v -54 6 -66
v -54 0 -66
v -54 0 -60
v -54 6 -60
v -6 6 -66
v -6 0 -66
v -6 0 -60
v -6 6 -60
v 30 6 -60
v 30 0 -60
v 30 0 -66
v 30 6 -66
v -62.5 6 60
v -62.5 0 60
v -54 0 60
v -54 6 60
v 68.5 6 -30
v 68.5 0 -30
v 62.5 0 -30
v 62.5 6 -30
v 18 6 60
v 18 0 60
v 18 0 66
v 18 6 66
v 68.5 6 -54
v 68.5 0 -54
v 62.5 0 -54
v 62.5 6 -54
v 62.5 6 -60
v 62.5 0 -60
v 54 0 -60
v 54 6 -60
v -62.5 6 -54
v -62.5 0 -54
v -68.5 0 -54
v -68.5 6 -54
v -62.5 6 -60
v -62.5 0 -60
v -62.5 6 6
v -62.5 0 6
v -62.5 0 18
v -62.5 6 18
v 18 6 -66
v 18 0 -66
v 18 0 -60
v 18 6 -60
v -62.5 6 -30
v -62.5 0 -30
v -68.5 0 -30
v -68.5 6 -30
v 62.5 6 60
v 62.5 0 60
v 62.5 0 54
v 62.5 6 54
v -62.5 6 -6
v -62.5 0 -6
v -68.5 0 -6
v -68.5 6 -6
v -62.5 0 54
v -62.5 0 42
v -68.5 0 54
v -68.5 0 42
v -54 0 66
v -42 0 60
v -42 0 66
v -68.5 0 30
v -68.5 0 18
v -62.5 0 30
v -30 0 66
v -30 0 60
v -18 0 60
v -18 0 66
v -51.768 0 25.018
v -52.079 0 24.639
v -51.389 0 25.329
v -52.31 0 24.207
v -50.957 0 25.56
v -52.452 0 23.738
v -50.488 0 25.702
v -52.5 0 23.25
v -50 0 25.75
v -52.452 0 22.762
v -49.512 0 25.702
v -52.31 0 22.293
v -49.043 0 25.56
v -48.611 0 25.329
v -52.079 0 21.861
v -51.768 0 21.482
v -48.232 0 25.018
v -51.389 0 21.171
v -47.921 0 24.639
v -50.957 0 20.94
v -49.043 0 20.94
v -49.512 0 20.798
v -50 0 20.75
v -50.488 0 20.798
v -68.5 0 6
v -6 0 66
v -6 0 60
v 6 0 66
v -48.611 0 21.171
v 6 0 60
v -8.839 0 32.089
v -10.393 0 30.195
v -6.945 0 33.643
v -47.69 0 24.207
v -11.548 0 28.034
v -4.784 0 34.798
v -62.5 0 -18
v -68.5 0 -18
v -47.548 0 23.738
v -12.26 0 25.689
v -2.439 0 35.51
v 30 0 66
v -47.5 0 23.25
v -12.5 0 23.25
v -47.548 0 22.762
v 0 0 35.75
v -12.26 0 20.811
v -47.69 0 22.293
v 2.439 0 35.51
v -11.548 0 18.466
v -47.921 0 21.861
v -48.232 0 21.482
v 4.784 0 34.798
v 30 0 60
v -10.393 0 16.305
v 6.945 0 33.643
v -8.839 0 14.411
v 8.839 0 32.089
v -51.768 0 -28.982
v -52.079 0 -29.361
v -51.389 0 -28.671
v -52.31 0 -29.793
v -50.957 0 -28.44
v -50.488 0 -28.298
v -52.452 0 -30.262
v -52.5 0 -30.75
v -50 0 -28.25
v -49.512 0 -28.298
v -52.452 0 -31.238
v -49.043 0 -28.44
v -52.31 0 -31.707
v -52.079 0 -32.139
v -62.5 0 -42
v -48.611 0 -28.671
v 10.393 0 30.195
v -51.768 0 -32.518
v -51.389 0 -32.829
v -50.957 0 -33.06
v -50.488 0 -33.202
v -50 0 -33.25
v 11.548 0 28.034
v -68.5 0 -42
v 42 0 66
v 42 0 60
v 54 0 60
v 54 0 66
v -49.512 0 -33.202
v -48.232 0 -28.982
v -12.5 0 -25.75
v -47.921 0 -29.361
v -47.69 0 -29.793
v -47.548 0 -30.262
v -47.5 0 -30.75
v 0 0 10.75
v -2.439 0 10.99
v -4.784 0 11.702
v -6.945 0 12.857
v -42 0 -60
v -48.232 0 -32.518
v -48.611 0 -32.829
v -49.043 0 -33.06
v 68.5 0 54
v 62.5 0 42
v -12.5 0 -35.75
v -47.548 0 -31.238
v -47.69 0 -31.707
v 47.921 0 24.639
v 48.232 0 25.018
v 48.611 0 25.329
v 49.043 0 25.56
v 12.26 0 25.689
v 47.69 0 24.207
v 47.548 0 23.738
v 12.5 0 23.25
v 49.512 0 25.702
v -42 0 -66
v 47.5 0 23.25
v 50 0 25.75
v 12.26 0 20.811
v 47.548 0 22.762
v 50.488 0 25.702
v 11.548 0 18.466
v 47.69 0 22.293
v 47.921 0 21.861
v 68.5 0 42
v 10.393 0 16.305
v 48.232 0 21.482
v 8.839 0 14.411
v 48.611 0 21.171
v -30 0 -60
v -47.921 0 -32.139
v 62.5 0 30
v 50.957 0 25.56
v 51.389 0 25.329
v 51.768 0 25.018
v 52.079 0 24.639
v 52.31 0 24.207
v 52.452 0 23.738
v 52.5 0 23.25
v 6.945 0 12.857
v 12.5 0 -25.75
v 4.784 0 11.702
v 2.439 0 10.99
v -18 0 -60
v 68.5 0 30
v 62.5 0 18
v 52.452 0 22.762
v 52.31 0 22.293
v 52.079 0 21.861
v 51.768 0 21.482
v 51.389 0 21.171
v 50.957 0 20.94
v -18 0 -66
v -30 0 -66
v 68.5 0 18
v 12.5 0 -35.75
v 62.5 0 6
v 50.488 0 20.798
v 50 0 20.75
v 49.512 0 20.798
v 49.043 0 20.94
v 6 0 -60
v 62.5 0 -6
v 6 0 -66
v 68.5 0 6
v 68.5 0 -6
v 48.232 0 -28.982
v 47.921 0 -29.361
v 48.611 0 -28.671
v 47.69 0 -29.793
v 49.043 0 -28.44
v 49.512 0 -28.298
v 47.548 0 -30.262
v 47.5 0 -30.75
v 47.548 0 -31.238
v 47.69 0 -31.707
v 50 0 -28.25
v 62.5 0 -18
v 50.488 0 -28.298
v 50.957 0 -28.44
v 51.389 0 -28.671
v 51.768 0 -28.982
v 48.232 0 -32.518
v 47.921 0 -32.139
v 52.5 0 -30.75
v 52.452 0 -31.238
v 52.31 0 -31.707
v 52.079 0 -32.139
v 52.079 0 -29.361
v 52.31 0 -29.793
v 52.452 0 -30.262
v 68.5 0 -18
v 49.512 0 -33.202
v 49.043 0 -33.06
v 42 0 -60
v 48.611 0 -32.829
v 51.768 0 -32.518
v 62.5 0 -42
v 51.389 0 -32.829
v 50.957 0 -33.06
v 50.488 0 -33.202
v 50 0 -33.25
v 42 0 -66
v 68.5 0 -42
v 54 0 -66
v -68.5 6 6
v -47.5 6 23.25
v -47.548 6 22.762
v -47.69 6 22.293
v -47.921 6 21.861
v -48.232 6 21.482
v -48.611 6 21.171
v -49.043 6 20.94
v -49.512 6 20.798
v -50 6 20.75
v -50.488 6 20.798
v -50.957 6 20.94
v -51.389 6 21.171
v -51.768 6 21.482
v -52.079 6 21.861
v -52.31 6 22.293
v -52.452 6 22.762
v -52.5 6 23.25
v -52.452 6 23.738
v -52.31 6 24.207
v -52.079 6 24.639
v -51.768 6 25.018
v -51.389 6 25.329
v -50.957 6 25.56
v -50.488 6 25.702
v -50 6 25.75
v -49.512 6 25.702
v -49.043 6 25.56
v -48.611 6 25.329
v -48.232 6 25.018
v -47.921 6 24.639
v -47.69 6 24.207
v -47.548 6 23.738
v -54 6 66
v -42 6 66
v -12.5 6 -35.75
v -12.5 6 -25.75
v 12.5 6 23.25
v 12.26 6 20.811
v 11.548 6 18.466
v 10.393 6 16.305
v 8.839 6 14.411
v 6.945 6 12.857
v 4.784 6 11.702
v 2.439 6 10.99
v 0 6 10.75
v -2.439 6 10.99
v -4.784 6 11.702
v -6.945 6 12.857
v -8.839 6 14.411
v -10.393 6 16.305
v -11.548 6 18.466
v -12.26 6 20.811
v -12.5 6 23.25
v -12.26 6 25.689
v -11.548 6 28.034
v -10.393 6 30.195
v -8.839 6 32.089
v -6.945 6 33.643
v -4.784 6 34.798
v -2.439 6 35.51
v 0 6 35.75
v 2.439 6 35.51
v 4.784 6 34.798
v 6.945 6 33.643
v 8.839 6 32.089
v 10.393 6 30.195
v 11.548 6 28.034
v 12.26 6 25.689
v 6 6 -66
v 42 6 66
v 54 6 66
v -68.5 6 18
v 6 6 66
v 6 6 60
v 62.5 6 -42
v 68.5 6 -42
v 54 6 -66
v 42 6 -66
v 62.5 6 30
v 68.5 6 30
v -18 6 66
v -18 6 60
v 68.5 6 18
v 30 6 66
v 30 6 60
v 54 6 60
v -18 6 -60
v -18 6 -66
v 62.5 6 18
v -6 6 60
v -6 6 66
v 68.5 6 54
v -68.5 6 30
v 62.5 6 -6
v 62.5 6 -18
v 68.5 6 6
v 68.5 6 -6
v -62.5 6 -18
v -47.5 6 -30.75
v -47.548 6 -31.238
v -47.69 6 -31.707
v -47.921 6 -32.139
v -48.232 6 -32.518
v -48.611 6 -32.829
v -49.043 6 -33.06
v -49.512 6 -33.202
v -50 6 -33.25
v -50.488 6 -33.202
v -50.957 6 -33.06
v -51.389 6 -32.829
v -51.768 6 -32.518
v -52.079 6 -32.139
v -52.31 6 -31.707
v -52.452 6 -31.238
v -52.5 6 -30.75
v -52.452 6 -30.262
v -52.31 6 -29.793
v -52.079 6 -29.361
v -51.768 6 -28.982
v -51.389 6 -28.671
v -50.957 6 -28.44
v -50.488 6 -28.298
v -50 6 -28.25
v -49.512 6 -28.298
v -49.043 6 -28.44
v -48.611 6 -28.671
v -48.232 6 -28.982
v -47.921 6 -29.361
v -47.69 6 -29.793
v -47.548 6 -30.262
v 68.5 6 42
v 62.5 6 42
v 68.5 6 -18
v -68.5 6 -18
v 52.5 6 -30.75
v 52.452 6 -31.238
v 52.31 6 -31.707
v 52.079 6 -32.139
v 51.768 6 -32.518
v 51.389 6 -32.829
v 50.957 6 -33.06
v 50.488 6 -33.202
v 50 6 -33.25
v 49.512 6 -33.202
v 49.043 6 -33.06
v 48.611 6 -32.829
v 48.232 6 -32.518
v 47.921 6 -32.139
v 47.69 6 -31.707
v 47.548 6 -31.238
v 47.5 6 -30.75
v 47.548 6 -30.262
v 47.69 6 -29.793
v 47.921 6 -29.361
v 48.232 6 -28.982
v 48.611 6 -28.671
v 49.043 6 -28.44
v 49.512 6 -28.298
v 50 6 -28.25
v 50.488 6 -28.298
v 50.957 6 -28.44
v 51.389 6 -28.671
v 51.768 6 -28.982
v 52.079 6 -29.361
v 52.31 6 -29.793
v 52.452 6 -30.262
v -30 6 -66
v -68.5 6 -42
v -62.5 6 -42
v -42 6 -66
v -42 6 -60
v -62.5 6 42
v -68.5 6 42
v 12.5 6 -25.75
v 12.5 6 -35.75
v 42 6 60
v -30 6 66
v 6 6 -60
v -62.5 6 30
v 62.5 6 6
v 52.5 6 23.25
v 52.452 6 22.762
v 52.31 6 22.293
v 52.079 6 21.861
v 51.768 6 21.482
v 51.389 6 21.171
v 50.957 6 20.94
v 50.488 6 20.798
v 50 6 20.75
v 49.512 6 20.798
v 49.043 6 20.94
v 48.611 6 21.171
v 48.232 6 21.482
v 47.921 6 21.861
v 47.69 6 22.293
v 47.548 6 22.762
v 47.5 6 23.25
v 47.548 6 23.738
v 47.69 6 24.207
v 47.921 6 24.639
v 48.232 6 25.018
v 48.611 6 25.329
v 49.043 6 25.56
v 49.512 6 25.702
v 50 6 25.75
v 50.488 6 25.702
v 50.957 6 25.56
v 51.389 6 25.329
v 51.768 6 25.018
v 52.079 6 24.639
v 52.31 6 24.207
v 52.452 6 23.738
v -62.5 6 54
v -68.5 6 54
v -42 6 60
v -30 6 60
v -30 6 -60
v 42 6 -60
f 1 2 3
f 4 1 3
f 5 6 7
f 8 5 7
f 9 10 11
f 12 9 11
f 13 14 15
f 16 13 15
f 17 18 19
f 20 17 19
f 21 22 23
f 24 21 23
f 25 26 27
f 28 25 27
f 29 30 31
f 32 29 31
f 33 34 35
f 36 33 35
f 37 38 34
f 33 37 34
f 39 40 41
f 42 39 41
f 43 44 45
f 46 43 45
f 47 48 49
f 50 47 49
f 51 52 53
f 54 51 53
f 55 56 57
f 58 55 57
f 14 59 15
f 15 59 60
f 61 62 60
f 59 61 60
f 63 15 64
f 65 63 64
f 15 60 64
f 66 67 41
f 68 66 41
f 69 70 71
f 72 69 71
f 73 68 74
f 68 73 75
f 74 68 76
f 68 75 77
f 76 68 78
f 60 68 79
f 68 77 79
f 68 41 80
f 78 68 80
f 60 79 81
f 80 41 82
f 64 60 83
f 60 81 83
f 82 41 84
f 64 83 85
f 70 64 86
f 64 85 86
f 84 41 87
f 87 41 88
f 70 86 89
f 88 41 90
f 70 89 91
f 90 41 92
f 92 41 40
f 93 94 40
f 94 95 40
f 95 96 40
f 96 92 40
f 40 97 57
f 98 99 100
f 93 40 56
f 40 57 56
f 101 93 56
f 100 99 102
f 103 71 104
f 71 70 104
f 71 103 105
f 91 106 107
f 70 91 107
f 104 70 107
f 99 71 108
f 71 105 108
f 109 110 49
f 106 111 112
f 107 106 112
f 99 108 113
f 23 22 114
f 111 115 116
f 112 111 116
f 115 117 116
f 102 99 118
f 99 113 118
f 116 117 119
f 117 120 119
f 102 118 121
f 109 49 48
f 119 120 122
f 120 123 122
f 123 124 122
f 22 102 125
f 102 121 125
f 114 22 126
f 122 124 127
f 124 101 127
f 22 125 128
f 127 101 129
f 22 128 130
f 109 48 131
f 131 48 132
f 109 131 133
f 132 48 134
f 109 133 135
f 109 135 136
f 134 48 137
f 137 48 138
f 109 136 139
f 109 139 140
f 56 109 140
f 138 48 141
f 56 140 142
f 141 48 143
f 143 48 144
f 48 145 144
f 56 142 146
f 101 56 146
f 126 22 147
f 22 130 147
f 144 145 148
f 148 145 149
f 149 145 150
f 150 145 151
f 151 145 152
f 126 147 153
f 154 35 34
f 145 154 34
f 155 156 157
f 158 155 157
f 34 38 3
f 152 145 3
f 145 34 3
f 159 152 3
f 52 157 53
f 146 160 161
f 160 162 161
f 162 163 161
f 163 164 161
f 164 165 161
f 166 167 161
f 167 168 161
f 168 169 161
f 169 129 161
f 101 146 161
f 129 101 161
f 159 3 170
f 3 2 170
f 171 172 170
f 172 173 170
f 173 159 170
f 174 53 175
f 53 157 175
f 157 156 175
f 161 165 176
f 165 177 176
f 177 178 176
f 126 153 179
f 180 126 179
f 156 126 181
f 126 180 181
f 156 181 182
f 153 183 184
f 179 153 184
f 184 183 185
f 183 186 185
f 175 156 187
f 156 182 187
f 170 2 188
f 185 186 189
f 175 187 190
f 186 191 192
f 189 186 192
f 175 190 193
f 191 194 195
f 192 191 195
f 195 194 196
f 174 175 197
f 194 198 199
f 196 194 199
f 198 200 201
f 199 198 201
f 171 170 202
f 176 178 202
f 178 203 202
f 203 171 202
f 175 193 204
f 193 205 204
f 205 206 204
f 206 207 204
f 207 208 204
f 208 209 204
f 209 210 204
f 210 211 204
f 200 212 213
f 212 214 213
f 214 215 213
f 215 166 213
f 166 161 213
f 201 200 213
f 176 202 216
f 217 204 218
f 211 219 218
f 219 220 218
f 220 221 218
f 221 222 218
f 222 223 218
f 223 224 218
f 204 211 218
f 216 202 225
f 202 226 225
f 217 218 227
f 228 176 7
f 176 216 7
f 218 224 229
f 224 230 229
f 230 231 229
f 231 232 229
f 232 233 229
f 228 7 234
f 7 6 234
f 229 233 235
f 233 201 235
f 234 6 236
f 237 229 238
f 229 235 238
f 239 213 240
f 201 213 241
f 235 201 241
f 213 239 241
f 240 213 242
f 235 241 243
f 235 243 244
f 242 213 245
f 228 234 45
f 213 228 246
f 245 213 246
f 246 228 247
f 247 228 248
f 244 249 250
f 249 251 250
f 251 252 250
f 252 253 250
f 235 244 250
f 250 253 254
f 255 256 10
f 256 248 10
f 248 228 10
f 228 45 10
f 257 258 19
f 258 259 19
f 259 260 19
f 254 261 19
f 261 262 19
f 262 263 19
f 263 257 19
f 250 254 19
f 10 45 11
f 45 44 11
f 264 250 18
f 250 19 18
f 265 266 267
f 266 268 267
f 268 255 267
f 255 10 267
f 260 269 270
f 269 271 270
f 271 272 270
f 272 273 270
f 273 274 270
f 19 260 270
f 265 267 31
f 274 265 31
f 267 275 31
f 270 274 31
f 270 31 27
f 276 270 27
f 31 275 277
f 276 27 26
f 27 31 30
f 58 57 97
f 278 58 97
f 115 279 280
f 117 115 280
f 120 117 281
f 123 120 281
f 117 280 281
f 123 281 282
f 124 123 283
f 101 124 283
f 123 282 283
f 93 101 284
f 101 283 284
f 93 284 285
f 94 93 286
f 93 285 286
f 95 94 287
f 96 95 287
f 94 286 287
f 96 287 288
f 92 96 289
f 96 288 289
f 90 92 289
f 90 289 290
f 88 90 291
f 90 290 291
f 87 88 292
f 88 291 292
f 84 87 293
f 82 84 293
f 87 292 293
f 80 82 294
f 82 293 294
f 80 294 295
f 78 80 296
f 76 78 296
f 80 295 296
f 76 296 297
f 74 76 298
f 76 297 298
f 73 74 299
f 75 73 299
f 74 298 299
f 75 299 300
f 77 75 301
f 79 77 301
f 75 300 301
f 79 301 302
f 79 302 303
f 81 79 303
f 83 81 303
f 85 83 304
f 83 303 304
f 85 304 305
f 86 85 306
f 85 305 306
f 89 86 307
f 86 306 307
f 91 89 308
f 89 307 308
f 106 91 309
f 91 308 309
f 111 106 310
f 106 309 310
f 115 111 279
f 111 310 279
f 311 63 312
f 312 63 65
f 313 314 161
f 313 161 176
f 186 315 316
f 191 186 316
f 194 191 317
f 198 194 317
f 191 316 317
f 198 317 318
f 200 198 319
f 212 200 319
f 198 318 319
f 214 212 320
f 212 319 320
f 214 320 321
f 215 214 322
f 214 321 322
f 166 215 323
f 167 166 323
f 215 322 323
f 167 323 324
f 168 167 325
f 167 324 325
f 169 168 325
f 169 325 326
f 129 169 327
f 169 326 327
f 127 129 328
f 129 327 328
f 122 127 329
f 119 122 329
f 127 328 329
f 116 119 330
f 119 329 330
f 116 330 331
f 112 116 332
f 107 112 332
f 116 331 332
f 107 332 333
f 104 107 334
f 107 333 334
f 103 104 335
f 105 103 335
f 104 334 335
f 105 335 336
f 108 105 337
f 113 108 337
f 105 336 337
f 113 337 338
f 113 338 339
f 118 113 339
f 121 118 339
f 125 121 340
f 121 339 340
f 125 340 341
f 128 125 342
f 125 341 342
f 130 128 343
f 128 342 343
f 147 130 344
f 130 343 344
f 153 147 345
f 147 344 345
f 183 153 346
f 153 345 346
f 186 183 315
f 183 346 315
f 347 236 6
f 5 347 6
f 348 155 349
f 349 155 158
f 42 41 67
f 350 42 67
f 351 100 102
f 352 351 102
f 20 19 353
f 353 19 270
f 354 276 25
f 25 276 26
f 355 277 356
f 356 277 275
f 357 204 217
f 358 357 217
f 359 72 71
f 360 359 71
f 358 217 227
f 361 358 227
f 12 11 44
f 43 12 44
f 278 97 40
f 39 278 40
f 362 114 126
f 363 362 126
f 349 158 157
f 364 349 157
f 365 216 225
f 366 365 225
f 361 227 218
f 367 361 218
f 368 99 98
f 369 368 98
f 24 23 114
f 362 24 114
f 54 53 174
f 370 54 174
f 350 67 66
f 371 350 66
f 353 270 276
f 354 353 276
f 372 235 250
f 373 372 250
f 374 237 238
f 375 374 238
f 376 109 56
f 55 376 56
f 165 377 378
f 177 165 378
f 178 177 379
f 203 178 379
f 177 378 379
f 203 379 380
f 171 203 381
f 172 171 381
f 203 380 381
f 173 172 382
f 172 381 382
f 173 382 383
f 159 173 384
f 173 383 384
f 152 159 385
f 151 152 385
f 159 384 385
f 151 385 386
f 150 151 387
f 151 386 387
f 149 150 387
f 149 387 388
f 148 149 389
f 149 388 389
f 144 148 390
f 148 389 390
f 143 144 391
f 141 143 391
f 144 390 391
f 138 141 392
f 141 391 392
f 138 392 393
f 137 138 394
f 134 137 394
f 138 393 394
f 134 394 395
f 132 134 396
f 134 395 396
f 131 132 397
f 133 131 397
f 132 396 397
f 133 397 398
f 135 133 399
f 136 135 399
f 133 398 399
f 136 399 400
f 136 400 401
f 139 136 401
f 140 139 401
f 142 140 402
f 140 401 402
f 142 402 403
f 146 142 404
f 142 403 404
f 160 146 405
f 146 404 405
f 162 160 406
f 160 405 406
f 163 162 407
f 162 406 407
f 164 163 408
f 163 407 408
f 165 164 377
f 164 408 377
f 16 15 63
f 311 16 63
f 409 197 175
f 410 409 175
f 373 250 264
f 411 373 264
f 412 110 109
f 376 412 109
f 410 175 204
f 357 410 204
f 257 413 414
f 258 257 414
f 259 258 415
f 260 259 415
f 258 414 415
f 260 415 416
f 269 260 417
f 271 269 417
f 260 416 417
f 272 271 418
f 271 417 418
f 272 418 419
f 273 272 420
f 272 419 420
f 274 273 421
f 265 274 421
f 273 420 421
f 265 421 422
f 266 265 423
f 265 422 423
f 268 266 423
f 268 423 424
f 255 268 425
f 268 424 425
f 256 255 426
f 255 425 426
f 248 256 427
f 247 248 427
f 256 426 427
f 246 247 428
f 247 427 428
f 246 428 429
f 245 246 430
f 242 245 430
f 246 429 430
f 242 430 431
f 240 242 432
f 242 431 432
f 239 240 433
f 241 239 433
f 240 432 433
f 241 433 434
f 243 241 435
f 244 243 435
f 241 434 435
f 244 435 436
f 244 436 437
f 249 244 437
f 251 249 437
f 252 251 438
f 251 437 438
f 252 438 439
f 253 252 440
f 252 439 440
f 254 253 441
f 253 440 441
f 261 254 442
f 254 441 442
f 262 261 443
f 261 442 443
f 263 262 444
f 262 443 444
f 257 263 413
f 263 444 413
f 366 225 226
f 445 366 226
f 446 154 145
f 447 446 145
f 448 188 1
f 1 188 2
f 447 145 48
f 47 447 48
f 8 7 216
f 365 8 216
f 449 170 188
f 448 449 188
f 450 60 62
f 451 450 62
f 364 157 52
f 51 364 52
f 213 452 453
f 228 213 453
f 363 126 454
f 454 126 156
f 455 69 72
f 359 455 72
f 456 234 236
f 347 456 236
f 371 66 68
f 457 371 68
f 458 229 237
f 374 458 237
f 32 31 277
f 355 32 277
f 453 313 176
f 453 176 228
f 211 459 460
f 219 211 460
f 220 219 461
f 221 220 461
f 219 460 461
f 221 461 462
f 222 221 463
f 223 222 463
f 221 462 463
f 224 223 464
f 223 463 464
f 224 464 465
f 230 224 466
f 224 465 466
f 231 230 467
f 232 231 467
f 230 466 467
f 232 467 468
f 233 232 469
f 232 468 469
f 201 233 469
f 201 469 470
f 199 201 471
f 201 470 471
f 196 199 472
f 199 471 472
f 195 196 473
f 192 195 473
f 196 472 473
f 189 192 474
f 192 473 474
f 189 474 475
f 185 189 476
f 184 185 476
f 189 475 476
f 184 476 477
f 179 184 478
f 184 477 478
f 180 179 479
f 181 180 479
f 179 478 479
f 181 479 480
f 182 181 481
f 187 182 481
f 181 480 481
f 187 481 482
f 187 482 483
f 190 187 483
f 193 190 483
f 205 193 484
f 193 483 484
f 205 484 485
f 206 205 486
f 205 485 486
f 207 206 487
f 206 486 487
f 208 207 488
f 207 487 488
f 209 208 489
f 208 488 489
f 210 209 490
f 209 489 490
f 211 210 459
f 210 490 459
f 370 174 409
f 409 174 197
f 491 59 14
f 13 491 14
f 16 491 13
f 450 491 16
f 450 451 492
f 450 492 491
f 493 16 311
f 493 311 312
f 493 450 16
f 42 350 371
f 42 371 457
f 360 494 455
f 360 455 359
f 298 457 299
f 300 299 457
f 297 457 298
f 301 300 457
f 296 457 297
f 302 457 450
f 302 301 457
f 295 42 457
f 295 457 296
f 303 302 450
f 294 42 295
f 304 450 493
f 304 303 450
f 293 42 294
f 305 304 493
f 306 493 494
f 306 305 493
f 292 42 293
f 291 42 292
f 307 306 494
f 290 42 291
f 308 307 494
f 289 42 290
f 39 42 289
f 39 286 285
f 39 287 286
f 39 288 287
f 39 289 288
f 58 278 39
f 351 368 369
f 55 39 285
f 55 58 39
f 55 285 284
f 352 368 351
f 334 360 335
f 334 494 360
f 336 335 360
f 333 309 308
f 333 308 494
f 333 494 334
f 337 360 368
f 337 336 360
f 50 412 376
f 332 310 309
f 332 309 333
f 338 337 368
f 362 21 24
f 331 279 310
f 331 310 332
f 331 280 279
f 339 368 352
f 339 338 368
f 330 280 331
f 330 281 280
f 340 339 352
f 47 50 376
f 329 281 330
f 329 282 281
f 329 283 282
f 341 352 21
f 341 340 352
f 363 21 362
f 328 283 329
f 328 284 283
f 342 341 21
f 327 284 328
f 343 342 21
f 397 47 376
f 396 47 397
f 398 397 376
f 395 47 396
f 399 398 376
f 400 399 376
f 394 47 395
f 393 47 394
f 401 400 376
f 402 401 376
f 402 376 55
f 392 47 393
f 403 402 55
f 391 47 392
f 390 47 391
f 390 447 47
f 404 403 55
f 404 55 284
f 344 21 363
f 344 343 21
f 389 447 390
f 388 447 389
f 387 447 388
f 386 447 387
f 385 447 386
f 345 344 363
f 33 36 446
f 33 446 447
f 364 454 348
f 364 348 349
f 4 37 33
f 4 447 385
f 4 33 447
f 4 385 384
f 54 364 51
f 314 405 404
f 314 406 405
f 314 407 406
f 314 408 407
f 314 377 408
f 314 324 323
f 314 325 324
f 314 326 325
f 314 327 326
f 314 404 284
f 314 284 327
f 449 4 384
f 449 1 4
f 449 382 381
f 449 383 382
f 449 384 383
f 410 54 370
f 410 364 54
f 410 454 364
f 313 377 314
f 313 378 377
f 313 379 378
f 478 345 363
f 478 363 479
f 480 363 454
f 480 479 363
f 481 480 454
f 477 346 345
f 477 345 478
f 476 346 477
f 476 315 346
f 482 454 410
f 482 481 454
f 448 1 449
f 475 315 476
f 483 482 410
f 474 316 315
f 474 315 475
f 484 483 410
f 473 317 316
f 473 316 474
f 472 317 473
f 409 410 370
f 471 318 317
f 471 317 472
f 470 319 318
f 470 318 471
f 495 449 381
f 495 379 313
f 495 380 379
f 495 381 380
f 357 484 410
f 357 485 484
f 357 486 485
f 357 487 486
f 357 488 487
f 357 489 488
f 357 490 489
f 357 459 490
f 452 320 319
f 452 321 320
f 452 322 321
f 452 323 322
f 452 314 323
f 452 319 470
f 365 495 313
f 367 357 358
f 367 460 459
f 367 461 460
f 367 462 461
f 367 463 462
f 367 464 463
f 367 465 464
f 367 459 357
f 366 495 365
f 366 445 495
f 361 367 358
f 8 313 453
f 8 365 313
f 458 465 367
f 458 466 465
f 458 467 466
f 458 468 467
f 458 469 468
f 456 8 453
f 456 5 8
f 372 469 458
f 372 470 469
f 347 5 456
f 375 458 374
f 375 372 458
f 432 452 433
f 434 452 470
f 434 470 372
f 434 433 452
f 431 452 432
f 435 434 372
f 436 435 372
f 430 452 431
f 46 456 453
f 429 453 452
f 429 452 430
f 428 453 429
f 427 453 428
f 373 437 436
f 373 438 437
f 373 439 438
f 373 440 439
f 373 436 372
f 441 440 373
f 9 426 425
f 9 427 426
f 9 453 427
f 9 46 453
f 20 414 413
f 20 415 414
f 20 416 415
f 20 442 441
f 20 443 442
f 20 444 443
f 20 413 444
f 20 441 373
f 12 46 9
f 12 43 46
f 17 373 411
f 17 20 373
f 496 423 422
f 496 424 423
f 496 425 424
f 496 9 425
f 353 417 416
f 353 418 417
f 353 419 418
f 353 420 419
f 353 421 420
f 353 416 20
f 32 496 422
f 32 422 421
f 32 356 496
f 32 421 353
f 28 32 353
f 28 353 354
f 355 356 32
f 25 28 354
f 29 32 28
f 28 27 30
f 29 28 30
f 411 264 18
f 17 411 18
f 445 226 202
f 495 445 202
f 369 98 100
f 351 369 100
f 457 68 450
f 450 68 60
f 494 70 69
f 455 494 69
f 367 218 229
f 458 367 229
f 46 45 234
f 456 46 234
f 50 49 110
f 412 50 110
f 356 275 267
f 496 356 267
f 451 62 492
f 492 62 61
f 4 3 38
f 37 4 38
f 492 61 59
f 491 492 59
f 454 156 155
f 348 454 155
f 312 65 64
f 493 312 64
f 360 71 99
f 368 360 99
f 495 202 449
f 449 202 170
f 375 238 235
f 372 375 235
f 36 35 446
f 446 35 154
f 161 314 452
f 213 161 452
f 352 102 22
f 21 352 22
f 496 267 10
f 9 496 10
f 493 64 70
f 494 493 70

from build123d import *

# Parameters (mm, degrees)
BOSS_EXTRUDE2_DEPTH = 6
SKETCH2_R           = 2.5
SKETCH2_R_2         = 12.5
SKETCH2_W           = 25
SKETCH2_H           = 10
CUT_EXTRUDE2_DEPTH  = 6


with BuildPart() as part:
    # Sketch1 → Boss-Extrude2 (new body)
    with BuildSketch(Plane(origin=(0, 0, 0), x_dir=(1, 0, 0), z_dir=(0, 1, 0))):
        Polygon((-62.5, -60), (-54, -60), (-54, -66), (-42, -66), (-42, -60), (-30, -60), (-30, -66), (-18, -66), (-18, -60), (-6, -60), (-6, -66), (6, -66), (6, -60), (18, -60), (18, -66), (30, -66), (30, -60), (42, -60), (42, -66), (54, -66), (54, -60), (62.5, -60), (62.5, -54), (68.5, -54), (68.5, -42), (62.5, -42), (62.5, -30), (68.5, -30), (68.5, -18), (62.5, -18), (62.5, -6), (68.5, -6), (68.5, 6), (62.5, 6), (62.5, 18), (68.5, 18), (68.5, 30), (62.5, 30), (62.5, 42), (68.5, 42), (68.5, 54), (62.5, 54), (62.5, 60), (54, 60), (54, 66), (42, 66), (42, 60), (30, 60), (30, 66), (18, 66), (18, 60), (6, 60), (6, 66), (-6, 66), (-6, 60), (-18, 60), (-18, 66), (-30, 66), (-30, 60), (-42, 60), (-42, 66), (-54, 66), (-54, 60), (-62.5, 60), (-62.5, 54), (-68.5, 54), (-68.5, 42), (-62.5, 42), (-62.5, 30), (-68.5, 30), (-68.5, 18), (-62.5, 18), (-62.5, 6), (-68.5, 6), (-68.5, -6), (-62.5, -6), (-62.5, -18), (-68.5, -18), (-68.5, -30), (-62.5, -30), (-62.5, -42), (-68.5, -42), (-68.5, -54), (-62.5, -54), align=None)
    extrude(amount=BOSS_EXTRUDE2_DEPTH)

    # Sketch2 → Cut-Extrude2 (cut)
    with BuildSketch(Plane(origin=(0, 6, 0), x_dir=(1, 0, 0), z_dir=(0, 1, 0))):
        with Locations((-50, -23.25)):
            Circle(SKETCH2_R)
        with Locations((0, -23.25)):
            Circle(SKETCH2_R_2)
        with Locations((50, -23.25)):
            Circle(SKETCH2_R)
        with Locations((-50, 30.75)):
            Circle(SKETCH2_R)
        with Locations((0, 30.75)):
            Rectangle(SKETCH2_W, SKETCH2_H)
        with Locations((50, 30.75)):
            Circle(SKETCH2_R)
    extrude(amount=-CUT_EXTRUDE2_DEPTH, mode=Mode.SUBTRACT)


solid = part.part
